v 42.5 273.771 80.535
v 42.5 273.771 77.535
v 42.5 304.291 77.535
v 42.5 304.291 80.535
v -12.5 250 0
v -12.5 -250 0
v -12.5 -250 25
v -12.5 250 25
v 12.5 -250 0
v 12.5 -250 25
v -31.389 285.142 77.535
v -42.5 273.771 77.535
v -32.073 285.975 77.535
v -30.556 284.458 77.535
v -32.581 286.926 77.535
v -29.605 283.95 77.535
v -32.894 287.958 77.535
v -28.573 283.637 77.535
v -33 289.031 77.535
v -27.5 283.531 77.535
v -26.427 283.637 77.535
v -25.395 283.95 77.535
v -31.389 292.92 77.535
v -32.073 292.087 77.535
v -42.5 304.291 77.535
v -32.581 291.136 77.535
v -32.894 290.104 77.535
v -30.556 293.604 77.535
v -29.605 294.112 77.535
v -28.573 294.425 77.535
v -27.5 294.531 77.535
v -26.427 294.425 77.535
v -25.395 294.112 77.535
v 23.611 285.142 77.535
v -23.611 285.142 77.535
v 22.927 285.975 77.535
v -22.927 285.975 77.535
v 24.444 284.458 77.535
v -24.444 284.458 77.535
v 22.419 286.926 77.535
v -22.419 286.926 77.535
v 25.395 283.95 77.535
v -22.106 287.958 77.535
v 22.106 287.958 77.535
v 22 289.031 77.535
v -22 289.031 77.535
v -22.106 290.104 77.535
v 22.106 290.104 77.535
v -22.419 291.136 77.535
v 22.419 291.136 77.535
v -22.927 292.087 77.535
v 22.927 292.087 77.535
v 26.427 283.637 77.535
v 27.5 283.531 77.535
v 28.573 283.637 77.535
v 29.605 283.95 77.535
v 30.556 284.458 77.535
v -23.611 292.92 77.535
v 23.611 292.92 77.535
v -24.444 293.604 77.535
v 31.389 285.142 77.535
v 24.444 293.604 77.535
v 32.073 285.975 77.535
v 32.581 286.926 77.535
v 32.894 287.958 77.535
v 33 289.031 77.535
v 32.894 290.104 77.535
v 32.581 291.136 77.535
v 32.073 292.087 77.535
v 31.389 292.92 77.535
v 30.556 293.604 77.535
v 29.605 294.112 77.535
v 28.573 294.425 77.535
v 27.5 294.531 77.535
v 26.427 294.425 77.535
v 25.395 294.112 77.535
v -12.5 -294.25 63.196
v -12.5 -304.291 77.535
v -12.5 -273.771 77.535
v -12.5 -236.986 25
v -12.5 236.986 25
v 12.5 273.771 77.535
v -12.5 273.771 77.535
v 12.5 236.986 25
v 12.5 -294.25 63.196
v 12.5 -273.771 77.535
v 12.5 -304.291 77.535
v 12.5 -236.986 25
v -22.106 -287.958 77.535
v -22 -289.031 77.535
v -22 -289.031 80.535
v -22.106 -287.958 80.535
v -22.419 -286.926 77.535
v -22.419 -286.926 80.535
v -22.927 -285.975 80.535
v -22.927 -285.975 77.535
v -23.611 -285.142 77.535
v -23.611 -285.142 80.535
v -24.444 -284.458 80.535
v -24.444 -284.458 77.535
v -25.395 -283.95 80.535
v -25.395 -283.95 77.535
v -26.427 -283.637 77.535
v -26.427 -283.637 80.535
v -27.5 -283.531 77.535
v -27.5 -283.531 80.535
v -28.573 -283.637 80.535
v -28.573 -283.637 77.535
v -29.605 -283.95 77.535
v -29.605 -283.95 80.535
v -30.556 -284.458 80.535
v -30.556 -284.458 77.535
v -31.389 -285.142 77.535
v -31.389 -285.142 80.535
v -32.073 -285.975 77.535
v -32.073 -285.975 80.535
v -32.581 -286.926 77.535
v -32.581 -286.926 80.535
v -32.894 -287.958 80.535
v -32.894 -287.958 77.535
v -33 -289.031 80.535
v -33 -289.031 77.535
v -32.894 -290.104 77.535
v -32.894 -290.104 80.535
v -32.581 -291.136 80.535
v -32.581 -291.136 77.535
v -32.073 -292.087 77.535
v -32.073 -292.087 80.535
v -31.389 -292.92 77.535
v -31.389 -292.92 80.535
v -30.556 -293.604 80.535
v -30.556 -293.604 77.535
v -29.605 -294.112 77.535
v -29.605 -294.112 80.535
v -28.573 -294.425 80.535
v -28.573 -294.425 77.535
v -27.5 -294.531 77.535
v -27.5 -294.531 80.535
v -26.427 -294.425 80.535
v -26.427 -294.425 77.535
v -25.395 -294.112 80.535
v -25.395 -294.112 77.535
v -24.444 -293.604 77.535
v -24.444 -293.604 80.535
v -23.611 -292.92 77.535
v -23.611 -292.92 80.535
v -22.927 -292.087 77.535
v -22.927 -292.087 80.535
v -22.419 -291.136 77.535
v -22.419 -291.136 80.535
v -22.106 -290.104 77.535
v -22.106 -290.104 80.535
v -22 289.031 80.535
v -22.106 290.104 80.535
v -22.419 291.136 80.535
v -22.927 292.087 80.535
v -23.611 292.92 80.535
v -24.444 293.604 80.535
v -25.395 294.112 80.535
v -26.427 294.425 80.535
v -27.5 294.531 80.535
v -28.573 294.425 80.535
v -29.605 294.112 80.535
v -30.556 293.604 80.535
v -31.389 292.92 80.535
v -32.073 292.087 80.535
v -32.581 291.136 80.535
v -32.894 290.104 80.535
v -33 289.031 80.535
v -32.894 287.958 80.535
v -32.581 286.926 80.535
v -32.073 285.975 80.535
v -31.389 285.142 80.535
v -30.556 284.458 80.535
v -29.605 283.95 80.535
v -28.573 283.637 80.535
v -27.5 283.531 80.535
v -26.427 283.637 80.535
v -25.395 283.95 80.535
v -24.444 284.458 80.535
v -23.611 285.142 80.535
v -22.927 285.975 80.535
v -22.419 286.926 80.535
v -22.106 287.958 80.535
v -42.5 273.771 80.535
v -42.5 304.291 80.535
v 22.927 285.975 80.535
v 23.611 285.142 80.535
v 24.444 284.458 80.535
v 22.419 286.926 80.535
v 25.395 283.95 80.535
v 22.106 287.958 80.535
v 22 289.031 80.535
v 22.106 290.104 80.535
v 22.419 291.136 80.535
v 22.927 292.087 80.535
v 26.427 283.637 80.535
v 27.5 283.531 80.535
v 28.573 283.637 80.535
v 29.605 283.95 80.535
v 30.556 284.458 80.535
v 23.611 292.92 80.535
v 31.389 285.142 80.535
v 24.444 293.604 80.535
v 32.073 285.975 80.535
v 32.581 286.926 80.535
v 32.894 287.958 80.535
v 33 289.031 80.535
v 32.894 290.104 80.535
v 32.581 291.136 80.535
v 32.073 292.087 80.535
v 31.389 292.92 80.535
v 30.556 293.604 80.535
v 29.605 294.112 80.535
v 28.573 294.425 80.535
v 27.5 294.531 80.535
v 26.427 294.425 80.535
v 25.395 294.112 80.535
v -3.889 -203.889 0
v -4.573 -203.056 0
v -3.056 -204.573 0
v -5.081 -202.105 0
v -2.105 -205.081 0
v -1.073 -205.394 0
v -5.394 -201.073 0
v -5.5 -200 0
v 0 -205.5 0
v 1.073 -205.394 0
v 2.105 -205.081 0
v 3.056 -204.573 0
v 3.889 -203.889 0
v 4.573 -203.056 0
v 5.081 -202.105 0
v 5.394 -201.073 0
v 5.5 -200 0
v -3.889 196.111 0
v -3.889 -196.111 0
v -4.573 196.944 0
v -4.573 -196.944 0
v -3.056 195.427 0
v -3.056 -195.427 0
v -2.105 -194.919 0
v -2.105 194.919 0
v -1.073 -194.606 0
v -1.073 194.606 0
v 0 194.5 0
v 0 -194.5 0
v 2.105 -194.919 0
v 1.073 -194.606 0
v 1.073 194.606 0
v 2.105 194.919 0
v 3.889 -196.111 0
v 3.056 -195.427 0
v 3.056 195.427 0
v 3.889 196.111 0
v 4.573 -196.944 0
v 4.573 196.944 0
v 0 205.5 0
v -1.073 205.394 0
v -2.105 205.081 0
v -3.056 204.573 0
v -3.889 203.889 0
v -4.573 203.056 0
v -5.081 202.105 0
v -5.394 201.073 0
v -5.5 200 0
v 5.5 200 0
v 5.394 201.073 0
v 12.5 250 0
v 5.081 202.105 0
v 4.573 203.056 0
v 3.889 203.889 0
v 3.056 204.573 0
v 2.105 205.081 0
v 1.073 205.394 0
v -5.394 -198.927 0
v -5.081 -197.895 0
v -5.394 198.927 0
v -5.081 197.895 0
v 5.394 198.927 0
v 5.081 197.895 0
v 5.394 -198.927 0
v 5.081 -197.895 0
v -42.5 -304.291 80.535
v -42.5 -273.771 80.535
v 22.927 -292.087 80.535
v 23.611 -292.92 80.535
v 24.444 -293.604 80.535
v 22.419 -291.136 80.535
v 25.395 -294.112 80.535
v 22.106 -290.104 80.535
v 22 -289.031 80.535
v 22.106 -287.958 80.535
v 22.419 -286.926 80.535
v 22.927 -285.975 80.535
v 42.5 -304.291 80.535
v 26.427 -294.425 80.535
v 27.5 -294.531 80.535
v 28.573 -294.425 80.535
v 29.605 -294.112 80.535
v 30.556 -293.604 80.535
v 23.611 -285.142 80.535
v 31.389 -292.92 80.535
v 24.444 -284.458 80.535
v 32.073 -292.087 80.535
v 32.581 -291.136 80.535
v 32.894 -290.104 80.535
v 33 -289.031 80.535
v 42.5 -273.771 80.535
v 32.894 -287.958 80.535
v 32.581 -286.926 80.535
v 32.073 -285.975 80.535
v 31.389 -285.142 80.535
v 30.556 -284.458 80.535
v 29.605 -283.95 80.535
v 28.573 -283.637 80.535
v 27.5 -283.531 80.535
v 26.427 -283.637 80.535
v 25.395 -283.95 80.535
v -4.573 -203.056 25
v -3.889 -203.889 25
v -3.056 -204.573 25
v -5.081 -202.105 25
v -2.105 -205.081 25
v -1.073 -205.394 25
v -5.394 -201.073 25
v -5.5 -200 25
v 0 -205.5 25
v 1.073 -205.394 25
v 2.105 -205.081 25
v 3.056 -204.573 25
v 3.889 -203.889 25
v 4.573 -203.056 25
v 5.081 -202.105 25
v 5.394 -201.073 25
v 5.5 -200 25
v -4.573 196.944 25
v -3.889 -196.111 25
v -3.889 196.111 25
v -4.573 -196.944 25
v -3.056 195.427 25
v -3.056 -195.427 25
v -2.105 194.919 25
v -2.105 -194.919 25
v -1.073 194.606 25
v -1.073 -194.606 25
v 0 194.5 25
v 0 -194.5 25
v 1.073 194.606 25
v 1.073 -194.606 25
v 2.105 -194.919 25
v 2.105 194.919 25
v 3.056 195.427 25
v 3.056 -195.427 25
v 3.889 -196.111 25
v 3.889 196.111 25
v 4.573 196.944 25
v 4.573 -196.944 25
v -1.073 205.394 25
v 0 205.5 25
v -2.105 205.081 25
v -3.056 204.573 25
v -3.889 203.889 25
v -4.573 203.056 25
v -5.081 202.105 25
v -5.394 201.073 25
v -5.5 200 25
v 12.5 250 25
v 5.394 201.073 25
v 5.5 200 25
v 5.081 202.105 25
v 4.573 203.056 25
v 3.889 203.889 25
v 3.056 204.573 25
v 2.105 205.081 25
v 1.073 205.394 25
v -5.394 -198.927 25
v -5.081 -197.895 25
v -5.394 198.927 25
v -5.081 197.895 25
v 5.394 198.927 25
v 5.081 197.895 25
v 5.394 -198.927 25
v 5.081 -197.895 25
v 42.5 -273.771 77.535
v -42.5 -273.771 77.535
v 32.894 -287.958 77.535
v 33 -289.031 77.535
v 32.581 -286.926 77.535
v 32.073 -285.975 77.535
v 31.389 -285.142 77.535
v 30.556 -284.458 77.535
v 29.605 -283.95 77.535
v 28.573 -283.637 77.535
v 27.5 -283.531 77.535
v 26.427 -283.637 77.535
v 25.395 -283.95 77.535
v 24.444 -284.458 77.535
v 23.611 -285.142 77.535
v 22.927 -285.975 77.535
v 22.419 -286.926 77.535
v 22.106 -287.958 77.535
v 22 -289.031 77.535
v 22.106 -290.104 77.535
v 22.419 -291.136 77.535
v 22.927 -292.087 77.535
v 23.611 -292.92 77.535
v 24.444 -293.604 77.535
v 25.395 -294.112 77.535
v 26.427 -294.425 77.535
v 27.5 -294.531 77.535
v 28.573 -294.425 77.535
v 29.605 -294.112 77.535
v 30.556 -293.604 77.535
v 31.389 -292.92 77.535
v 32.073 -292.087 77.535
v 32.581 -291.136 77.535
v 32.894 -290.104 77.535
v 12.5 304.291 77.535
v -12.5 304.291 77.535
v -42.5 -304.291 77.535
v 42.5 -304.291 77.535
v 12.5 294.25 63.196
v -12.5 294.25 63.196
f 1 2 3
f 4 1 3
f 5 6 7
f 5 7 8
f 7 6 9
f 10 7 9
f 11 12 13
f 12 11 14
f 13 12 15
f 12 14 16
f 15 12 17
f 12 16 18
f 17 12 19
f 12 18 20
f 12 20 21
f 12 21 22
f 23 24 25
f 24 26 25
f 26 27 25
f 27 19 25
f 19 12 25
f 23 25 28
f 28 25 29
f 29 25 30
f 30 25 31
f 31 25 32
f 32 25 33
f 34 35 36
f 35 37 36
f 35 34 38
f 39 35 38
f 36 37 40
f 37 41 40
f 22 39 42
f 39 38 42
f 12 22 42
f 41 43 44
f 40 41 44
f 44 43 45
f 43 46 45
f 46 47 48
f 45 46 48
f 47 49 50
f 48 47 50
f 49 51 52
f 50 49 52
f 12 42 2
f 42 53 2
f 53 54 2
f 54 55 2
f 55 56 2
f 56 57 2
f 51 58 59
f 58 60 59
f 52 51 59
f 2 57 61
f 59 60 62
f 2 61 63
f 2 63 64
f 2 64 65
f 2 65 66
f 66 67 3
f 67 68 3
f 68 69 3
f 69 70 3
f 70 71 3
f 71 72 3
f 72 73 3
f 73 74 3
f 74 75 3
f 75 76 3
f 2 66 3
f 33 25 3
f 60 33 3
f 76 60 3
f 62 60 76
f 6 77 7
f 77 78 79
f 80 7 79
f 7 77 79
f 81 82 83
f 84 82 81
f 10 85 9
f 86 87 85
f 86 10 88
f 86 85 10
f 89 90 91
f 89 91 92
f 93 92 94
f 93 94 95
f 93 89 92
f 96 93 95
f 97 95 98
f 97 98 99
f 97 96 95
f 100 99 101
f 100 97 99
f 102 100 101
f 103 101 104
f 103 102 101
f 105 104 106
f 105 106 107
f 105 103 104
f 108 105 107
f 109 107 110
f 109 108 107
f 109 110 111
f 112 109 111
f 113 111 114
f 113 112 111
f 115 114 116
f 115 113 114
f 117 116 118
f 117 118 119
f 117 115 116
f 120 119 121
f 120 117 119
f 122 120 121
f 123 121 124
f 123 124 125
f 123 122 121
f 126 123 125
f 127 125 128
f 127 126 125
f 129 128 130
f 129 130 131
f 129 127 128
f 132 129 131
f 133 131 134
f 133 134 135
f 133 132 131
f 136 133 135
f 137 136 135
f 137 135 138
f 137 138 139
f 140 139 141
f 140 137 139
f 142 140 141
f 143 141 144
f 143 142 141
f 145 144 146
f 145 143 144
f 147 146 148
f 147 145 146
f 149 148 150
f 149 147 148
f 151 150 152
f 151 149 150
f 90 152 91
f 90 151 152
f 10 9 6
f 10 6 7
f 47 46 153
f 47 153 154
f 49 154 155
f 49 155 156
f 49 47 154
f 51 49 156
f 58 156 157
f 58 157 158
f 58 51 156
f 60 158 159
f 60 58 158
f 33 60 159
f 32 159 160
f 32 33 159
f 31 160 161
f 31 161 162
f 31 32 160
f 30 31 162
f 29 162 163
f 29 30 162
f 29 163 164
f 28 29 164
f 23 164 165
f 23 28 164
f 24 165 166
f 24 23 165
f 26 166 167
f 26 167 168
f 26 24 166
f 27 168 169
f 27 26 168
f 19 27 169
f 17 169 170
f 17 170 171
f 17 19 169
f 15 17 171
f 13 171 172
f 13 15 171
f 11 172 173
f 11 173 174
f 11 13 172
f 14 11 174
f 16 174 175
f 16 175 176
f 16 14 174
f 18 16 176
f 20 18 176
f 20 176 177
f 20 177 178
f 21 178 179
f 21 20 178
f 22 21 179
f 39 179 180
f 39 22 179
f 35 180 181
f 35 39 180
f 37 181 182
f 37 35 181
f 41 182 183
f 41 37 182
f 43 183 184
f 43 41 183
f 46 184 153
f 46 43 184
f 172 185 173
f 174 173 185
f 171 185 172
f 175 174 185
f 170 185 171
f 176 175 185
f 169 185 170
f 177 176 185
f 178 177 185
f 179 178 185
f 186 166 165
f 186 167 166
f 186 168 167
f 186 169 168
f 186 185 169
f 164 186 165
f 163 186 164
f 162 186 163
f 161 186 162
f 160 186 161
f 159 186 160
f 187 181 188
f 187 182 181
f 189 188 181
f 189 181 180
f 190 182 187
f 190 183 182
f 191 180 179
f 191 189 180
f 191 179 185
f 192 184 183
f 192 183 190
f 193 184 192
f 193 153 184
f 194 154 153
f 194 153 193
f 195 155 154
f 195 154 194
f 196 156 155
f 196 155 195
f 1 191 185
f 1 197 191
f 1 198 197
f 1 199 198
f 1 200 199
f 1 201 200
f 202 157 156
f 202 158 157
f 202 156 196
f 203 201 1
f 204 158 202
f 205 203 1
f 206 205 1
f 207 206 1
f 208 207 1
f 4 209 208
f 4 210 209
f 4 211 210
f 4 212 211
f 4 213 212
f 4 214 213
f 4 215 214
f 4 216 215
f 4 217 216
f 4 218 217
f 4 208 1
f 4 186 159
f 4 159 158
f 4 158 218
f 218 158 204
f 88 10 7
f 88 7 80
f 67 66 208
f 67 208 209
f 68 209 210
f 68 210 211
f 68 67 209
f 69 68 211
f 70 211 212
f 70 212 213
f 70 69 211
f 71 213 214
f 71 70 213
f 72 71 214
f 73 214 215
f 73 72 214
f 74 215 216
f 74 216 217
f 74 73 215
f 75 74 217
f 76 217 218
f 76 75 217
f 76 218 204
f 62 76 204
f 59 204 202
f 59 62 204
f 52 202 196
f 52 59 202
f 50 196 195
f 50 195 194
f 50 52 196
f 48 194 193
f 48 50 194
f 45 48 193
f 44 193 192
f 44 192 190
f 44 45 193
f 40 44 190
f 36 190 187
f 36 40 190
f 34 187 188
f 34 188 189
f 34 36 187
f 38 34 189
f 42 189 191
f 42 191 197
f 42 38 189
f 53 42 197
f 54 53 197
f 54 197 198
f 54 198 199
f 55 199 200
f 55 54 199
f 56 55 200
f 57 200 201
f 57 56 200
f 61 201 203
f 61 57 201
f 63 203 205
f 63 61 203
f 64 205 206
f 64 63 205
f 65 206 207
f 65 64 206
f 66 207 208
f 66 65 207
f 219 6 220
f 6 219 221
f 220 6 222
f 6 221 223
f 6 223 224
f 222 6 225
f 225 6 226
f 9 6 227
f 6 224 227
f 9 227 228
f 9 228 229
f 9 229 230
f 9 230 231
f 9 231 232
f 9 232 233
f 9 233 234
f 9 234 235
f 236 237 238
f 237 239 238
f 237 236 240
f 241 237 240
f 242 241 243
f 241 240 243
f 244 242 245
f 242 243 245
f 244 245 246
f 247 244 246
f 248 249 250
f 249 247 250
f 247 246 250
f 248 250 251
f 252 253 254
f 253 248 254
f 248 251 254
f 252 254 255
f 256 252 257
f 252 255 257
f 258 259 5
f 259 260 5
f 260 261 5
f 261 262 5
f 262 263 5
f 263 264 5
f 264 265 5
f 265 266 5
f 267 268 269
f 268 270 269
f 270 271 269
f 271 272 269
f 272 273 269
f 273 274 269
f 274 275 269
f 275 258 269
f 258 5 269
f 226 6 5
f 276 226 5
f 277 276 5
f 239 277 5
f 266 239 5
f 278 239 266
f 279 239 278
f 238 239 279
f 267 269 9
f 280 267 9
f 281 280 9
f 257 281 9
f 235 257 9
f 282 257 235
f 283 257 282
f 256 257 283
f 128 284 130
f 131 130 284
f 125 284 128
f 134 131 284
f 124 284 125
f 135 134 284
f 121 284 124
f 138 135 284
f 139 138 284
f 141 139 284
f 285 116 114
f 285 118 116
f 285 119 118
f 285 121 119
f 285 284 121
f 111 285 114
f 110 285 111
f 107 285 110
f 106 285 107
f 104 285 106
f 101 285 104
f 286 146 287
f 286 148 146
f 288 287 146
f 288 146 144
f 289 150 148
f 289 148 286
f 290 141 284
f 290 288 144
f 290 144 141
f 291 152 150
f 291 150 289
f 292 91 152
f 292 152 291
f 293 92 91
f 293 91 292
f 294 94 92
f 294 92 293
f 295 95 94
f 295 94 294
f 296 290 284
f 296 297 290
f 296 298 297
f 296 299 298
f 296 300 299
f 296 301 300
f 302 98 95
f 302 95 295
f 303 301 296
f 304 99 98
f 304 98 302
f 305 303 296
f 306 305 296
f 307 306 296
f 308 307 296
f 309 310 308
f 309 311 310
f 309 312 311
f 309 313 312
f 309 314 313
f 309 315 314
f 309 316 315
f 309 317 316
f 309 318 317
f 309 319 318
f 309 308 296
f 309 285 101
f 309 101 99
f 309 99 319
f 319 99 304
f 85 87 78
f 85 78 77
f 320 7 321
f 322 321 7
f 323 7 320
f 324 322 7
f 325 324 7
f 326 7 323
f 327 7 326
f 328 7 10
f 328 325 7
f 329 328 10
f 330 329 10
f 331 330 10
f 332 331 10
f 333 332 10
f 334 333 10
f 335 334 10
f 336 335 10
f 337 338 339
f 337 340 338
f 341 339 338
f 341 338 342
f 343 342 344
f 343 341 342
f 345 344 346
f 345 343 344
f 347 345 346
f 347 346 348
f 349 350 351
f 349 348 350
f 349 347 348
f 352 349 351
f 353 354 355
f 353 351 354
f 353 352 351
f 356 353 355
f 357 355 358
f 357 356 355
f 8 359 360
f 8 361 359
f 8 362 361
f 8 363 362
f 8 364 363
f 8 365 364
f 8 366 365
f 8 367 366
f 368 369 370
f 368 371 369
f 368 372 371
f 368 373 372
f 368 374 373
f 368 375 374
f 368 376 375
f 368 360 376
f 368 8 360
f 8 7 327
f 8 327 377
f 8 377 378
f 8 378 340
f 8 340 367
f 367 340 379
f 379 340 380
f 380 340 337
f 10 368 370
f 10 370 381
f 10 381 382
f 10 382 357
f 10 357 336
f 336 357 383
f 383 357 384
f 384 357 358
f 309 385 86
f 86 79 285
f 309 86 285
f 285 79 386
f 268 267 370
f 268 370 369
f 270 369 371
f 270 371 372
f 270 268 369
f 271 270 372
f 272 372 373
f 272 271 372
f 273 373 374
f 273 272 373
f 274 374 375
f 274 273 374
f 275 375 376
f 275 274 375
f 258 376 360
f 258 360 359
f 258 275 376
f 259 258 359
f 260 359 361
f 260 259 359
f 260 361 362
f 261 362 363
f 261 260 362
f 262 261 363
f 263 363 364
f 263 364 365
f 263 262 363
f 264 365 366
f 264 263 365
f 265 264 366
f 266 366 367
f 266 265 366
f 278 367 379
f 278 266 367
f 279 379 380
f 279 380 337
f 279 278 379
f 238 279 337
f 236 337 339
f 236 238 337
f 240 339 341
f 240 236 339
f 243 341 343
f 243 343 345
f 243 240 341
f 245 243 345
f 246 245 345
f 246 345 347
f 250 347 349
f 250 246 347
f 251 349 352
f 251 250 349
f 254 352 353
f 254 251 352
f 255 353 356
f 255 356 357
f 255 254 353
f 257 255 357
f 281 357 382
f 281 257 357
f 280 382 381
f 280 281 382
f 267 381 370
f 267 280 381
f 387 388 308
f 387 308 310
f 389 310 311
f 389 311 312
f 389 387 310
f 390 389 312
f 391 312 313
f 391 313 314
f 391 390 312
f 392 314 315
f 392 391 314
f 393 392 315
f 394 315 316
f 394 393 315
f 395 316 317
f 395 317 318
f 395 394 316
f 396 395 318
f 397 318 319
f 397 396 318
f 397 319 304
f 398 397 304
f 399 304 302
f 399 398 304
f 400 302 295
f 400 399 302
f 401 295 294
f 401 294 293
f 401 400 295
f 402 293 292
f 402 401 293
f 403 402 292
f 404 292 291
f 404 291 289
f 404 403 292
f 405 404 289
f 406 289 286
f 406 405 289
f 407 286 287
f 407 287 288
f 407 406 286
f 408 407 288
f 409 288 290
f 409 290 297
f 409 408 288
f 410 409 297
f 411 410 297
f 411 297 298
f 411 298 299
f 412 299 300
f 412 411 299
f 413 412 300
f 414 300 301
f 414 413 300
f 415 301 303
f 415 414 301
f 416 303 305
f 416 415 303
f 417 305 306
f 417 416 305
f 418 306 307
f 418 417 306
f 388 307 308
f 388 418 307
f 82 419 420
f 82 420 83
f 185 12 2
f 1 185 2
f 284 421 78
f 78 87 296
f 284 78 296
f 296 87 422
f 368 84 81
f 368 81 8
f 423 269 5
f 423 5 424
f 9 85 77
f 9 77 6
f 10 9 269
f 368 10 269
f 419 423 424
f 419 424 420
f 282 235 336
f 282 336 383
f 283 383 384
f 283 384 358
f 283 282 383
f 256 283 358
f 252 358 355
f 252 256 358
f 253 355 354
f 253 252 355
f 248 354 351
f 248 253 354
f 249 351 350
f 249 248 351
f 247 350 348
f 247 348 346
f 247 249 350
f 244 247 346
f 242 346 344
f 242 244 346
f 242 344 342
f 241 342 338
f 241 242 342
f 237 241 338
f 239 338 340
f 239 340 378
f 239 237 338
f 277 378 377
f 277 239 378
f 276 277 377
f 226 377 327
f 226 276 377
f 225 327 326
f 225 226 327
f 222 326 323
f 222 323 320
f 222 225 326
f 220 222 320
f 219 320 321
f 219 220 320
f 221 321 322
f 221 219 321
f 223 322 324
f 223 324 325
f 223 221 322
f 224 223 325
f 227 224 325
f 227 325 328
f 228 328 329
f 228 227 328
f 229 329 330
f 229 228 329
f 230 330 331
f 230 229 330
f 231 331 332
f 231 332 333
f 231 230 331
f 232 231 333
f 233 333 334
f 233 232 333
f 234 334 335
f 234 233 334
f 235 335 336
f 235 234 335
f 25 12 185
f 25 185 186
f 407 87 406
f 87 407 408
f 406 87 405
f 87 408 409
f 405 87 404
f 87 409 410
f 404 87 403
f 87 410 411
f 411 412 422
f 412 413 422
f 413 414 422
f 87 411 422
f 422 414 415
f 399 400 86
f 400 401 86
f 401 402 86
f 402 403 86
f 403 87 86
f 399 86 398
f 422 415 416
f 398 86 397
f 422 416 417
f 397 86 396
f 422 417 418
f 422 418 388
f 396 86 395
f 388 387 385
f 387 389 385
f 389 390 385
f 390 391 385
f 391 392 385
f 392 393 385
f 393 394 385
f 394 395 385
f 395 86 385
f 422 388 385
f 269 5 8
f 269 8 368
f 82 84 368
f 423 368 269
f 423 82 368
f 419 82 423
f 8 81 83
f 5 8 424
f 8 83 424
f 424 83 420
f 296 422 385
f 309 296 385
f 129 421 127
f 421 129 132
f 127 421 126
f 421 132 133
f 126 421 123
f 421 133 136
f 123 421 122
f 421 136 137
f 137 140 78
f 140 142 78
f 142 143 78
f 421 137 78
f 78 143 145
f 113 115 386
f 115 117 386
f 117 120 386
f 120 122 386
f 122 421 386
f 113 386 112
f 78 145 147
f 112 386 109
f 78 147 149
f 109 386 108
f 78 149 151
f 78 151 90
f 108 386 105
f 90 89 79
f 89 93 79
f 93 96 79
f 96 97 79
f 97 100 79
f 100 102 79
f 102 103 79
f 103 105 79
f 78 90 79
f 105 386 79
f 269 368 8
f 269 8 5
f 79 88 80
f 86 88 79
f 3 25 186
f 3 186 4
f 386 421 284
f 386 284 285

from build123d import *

# Parameters (mm, degrees)
F0_W     = 25
F0_H     = 500
F0_R     = 5.5
F1_DEPTH = 25
F3_DEPTH = 25
F4_W     = 30
F4_H     = 30.519364719
F4_R     = 5.5
F4_W_2   = 25
F5_DEPTH = 3
F4_W_3   = 85


# Not quite as in the source:
# - a feature names something its author has since deleted; it is built from what else it names


with BuildPart() as f1:
    # F0 (on Top) → F1 (new body)
    with BuildSketch(Plane.XY):
        Rectangle(F0_W, F0_H)
        with Locations((0, -200)):
            Circle(F0_R, mode=Mode.SUBTRACT)
        with Locations((0, 200)):
            Circle(F0_R, mode=Mode.SUBTRACT)
    extrude(amount=F1_DEPTH)


with BuildPart() as f3:
    # F2 (on face) → F3 (new body)
    with BuildSketch(Plane.YZ.offset(12.5)):
        Polygon((-294.2501667927, 63.1957875029), (-250, 0), (-250, 25), (-236.9858237362, 25), (-273.7713656854, 77.5351984117), align=None)
        Polygon((-304.2907304045, 77.5351984117), (-294.2501667927, 63.1957875029), (-273.7713656854, 77.5351984117), align=None)
    extrude(amount=-F3_DEPTH)

    # F4 (on face) → F5 (join)
    with BuildSketch(Plane.XY.offset(77.5351984117)):
        with Locations((-27.5, -289.0310480449)):
            Rectangle(F4_W, F4_H)
        with Locations((-27.5, -289.0310480449)):
            Circle(F4_R, mode=Mode.SUBTRACT)
        with Locations((0, -289.0310480449)):
            Rectangle(F4_W_2, F4_H)
        with Locations((27.5, -289.0310480449)):
            Rectangle(F4_W, F4_H)
        with Locations((27.5, -289.0310480449)):
            Circle(F4_R, mode=Mode.SUBTRACT)
    extrude(amount=F5_DEPTH)


with BuildPart() as f3b:
    # F2 (on face) → F3, piece 2 (new body)
    with BuildSketch(Plane.YZ.offset(12.5)):
        Polygon((250, 25), (250, 0), (294.2501667927, 63.1957875029), (273.7713656854, 77.5351984117), (236.9858237362, 25), align=None)
        Polygon((273.7713656854, 77.5351984117), (294.2501667927, 63.1957875029), (304.2907304045, 77.5351984117), align=None)
    extrude(amount=-F3_DEPTH)


with BuildPart() as f5:
    # F4 (on face) → F5, piece 2 (new body)
    with BuildSketch(Plane.XY.offset(77.5351984117)):
        with Locations((0, 289.0310480449)):
            Rectangle(F4_W_3, F4_H)
        with Locations((-27.5, 289.0310480449)):
            Circle(F4_R, mode=Mode.SUBTRACT)
        with Locations((27.5, 289.0310480449)):
            Circle(F4_R, mode=Mode.SUBTRACT)
    extrude(amount=F5_DEPTH)


solid = Compound([f1.part, f3.part, f3b.part, f5.part])
